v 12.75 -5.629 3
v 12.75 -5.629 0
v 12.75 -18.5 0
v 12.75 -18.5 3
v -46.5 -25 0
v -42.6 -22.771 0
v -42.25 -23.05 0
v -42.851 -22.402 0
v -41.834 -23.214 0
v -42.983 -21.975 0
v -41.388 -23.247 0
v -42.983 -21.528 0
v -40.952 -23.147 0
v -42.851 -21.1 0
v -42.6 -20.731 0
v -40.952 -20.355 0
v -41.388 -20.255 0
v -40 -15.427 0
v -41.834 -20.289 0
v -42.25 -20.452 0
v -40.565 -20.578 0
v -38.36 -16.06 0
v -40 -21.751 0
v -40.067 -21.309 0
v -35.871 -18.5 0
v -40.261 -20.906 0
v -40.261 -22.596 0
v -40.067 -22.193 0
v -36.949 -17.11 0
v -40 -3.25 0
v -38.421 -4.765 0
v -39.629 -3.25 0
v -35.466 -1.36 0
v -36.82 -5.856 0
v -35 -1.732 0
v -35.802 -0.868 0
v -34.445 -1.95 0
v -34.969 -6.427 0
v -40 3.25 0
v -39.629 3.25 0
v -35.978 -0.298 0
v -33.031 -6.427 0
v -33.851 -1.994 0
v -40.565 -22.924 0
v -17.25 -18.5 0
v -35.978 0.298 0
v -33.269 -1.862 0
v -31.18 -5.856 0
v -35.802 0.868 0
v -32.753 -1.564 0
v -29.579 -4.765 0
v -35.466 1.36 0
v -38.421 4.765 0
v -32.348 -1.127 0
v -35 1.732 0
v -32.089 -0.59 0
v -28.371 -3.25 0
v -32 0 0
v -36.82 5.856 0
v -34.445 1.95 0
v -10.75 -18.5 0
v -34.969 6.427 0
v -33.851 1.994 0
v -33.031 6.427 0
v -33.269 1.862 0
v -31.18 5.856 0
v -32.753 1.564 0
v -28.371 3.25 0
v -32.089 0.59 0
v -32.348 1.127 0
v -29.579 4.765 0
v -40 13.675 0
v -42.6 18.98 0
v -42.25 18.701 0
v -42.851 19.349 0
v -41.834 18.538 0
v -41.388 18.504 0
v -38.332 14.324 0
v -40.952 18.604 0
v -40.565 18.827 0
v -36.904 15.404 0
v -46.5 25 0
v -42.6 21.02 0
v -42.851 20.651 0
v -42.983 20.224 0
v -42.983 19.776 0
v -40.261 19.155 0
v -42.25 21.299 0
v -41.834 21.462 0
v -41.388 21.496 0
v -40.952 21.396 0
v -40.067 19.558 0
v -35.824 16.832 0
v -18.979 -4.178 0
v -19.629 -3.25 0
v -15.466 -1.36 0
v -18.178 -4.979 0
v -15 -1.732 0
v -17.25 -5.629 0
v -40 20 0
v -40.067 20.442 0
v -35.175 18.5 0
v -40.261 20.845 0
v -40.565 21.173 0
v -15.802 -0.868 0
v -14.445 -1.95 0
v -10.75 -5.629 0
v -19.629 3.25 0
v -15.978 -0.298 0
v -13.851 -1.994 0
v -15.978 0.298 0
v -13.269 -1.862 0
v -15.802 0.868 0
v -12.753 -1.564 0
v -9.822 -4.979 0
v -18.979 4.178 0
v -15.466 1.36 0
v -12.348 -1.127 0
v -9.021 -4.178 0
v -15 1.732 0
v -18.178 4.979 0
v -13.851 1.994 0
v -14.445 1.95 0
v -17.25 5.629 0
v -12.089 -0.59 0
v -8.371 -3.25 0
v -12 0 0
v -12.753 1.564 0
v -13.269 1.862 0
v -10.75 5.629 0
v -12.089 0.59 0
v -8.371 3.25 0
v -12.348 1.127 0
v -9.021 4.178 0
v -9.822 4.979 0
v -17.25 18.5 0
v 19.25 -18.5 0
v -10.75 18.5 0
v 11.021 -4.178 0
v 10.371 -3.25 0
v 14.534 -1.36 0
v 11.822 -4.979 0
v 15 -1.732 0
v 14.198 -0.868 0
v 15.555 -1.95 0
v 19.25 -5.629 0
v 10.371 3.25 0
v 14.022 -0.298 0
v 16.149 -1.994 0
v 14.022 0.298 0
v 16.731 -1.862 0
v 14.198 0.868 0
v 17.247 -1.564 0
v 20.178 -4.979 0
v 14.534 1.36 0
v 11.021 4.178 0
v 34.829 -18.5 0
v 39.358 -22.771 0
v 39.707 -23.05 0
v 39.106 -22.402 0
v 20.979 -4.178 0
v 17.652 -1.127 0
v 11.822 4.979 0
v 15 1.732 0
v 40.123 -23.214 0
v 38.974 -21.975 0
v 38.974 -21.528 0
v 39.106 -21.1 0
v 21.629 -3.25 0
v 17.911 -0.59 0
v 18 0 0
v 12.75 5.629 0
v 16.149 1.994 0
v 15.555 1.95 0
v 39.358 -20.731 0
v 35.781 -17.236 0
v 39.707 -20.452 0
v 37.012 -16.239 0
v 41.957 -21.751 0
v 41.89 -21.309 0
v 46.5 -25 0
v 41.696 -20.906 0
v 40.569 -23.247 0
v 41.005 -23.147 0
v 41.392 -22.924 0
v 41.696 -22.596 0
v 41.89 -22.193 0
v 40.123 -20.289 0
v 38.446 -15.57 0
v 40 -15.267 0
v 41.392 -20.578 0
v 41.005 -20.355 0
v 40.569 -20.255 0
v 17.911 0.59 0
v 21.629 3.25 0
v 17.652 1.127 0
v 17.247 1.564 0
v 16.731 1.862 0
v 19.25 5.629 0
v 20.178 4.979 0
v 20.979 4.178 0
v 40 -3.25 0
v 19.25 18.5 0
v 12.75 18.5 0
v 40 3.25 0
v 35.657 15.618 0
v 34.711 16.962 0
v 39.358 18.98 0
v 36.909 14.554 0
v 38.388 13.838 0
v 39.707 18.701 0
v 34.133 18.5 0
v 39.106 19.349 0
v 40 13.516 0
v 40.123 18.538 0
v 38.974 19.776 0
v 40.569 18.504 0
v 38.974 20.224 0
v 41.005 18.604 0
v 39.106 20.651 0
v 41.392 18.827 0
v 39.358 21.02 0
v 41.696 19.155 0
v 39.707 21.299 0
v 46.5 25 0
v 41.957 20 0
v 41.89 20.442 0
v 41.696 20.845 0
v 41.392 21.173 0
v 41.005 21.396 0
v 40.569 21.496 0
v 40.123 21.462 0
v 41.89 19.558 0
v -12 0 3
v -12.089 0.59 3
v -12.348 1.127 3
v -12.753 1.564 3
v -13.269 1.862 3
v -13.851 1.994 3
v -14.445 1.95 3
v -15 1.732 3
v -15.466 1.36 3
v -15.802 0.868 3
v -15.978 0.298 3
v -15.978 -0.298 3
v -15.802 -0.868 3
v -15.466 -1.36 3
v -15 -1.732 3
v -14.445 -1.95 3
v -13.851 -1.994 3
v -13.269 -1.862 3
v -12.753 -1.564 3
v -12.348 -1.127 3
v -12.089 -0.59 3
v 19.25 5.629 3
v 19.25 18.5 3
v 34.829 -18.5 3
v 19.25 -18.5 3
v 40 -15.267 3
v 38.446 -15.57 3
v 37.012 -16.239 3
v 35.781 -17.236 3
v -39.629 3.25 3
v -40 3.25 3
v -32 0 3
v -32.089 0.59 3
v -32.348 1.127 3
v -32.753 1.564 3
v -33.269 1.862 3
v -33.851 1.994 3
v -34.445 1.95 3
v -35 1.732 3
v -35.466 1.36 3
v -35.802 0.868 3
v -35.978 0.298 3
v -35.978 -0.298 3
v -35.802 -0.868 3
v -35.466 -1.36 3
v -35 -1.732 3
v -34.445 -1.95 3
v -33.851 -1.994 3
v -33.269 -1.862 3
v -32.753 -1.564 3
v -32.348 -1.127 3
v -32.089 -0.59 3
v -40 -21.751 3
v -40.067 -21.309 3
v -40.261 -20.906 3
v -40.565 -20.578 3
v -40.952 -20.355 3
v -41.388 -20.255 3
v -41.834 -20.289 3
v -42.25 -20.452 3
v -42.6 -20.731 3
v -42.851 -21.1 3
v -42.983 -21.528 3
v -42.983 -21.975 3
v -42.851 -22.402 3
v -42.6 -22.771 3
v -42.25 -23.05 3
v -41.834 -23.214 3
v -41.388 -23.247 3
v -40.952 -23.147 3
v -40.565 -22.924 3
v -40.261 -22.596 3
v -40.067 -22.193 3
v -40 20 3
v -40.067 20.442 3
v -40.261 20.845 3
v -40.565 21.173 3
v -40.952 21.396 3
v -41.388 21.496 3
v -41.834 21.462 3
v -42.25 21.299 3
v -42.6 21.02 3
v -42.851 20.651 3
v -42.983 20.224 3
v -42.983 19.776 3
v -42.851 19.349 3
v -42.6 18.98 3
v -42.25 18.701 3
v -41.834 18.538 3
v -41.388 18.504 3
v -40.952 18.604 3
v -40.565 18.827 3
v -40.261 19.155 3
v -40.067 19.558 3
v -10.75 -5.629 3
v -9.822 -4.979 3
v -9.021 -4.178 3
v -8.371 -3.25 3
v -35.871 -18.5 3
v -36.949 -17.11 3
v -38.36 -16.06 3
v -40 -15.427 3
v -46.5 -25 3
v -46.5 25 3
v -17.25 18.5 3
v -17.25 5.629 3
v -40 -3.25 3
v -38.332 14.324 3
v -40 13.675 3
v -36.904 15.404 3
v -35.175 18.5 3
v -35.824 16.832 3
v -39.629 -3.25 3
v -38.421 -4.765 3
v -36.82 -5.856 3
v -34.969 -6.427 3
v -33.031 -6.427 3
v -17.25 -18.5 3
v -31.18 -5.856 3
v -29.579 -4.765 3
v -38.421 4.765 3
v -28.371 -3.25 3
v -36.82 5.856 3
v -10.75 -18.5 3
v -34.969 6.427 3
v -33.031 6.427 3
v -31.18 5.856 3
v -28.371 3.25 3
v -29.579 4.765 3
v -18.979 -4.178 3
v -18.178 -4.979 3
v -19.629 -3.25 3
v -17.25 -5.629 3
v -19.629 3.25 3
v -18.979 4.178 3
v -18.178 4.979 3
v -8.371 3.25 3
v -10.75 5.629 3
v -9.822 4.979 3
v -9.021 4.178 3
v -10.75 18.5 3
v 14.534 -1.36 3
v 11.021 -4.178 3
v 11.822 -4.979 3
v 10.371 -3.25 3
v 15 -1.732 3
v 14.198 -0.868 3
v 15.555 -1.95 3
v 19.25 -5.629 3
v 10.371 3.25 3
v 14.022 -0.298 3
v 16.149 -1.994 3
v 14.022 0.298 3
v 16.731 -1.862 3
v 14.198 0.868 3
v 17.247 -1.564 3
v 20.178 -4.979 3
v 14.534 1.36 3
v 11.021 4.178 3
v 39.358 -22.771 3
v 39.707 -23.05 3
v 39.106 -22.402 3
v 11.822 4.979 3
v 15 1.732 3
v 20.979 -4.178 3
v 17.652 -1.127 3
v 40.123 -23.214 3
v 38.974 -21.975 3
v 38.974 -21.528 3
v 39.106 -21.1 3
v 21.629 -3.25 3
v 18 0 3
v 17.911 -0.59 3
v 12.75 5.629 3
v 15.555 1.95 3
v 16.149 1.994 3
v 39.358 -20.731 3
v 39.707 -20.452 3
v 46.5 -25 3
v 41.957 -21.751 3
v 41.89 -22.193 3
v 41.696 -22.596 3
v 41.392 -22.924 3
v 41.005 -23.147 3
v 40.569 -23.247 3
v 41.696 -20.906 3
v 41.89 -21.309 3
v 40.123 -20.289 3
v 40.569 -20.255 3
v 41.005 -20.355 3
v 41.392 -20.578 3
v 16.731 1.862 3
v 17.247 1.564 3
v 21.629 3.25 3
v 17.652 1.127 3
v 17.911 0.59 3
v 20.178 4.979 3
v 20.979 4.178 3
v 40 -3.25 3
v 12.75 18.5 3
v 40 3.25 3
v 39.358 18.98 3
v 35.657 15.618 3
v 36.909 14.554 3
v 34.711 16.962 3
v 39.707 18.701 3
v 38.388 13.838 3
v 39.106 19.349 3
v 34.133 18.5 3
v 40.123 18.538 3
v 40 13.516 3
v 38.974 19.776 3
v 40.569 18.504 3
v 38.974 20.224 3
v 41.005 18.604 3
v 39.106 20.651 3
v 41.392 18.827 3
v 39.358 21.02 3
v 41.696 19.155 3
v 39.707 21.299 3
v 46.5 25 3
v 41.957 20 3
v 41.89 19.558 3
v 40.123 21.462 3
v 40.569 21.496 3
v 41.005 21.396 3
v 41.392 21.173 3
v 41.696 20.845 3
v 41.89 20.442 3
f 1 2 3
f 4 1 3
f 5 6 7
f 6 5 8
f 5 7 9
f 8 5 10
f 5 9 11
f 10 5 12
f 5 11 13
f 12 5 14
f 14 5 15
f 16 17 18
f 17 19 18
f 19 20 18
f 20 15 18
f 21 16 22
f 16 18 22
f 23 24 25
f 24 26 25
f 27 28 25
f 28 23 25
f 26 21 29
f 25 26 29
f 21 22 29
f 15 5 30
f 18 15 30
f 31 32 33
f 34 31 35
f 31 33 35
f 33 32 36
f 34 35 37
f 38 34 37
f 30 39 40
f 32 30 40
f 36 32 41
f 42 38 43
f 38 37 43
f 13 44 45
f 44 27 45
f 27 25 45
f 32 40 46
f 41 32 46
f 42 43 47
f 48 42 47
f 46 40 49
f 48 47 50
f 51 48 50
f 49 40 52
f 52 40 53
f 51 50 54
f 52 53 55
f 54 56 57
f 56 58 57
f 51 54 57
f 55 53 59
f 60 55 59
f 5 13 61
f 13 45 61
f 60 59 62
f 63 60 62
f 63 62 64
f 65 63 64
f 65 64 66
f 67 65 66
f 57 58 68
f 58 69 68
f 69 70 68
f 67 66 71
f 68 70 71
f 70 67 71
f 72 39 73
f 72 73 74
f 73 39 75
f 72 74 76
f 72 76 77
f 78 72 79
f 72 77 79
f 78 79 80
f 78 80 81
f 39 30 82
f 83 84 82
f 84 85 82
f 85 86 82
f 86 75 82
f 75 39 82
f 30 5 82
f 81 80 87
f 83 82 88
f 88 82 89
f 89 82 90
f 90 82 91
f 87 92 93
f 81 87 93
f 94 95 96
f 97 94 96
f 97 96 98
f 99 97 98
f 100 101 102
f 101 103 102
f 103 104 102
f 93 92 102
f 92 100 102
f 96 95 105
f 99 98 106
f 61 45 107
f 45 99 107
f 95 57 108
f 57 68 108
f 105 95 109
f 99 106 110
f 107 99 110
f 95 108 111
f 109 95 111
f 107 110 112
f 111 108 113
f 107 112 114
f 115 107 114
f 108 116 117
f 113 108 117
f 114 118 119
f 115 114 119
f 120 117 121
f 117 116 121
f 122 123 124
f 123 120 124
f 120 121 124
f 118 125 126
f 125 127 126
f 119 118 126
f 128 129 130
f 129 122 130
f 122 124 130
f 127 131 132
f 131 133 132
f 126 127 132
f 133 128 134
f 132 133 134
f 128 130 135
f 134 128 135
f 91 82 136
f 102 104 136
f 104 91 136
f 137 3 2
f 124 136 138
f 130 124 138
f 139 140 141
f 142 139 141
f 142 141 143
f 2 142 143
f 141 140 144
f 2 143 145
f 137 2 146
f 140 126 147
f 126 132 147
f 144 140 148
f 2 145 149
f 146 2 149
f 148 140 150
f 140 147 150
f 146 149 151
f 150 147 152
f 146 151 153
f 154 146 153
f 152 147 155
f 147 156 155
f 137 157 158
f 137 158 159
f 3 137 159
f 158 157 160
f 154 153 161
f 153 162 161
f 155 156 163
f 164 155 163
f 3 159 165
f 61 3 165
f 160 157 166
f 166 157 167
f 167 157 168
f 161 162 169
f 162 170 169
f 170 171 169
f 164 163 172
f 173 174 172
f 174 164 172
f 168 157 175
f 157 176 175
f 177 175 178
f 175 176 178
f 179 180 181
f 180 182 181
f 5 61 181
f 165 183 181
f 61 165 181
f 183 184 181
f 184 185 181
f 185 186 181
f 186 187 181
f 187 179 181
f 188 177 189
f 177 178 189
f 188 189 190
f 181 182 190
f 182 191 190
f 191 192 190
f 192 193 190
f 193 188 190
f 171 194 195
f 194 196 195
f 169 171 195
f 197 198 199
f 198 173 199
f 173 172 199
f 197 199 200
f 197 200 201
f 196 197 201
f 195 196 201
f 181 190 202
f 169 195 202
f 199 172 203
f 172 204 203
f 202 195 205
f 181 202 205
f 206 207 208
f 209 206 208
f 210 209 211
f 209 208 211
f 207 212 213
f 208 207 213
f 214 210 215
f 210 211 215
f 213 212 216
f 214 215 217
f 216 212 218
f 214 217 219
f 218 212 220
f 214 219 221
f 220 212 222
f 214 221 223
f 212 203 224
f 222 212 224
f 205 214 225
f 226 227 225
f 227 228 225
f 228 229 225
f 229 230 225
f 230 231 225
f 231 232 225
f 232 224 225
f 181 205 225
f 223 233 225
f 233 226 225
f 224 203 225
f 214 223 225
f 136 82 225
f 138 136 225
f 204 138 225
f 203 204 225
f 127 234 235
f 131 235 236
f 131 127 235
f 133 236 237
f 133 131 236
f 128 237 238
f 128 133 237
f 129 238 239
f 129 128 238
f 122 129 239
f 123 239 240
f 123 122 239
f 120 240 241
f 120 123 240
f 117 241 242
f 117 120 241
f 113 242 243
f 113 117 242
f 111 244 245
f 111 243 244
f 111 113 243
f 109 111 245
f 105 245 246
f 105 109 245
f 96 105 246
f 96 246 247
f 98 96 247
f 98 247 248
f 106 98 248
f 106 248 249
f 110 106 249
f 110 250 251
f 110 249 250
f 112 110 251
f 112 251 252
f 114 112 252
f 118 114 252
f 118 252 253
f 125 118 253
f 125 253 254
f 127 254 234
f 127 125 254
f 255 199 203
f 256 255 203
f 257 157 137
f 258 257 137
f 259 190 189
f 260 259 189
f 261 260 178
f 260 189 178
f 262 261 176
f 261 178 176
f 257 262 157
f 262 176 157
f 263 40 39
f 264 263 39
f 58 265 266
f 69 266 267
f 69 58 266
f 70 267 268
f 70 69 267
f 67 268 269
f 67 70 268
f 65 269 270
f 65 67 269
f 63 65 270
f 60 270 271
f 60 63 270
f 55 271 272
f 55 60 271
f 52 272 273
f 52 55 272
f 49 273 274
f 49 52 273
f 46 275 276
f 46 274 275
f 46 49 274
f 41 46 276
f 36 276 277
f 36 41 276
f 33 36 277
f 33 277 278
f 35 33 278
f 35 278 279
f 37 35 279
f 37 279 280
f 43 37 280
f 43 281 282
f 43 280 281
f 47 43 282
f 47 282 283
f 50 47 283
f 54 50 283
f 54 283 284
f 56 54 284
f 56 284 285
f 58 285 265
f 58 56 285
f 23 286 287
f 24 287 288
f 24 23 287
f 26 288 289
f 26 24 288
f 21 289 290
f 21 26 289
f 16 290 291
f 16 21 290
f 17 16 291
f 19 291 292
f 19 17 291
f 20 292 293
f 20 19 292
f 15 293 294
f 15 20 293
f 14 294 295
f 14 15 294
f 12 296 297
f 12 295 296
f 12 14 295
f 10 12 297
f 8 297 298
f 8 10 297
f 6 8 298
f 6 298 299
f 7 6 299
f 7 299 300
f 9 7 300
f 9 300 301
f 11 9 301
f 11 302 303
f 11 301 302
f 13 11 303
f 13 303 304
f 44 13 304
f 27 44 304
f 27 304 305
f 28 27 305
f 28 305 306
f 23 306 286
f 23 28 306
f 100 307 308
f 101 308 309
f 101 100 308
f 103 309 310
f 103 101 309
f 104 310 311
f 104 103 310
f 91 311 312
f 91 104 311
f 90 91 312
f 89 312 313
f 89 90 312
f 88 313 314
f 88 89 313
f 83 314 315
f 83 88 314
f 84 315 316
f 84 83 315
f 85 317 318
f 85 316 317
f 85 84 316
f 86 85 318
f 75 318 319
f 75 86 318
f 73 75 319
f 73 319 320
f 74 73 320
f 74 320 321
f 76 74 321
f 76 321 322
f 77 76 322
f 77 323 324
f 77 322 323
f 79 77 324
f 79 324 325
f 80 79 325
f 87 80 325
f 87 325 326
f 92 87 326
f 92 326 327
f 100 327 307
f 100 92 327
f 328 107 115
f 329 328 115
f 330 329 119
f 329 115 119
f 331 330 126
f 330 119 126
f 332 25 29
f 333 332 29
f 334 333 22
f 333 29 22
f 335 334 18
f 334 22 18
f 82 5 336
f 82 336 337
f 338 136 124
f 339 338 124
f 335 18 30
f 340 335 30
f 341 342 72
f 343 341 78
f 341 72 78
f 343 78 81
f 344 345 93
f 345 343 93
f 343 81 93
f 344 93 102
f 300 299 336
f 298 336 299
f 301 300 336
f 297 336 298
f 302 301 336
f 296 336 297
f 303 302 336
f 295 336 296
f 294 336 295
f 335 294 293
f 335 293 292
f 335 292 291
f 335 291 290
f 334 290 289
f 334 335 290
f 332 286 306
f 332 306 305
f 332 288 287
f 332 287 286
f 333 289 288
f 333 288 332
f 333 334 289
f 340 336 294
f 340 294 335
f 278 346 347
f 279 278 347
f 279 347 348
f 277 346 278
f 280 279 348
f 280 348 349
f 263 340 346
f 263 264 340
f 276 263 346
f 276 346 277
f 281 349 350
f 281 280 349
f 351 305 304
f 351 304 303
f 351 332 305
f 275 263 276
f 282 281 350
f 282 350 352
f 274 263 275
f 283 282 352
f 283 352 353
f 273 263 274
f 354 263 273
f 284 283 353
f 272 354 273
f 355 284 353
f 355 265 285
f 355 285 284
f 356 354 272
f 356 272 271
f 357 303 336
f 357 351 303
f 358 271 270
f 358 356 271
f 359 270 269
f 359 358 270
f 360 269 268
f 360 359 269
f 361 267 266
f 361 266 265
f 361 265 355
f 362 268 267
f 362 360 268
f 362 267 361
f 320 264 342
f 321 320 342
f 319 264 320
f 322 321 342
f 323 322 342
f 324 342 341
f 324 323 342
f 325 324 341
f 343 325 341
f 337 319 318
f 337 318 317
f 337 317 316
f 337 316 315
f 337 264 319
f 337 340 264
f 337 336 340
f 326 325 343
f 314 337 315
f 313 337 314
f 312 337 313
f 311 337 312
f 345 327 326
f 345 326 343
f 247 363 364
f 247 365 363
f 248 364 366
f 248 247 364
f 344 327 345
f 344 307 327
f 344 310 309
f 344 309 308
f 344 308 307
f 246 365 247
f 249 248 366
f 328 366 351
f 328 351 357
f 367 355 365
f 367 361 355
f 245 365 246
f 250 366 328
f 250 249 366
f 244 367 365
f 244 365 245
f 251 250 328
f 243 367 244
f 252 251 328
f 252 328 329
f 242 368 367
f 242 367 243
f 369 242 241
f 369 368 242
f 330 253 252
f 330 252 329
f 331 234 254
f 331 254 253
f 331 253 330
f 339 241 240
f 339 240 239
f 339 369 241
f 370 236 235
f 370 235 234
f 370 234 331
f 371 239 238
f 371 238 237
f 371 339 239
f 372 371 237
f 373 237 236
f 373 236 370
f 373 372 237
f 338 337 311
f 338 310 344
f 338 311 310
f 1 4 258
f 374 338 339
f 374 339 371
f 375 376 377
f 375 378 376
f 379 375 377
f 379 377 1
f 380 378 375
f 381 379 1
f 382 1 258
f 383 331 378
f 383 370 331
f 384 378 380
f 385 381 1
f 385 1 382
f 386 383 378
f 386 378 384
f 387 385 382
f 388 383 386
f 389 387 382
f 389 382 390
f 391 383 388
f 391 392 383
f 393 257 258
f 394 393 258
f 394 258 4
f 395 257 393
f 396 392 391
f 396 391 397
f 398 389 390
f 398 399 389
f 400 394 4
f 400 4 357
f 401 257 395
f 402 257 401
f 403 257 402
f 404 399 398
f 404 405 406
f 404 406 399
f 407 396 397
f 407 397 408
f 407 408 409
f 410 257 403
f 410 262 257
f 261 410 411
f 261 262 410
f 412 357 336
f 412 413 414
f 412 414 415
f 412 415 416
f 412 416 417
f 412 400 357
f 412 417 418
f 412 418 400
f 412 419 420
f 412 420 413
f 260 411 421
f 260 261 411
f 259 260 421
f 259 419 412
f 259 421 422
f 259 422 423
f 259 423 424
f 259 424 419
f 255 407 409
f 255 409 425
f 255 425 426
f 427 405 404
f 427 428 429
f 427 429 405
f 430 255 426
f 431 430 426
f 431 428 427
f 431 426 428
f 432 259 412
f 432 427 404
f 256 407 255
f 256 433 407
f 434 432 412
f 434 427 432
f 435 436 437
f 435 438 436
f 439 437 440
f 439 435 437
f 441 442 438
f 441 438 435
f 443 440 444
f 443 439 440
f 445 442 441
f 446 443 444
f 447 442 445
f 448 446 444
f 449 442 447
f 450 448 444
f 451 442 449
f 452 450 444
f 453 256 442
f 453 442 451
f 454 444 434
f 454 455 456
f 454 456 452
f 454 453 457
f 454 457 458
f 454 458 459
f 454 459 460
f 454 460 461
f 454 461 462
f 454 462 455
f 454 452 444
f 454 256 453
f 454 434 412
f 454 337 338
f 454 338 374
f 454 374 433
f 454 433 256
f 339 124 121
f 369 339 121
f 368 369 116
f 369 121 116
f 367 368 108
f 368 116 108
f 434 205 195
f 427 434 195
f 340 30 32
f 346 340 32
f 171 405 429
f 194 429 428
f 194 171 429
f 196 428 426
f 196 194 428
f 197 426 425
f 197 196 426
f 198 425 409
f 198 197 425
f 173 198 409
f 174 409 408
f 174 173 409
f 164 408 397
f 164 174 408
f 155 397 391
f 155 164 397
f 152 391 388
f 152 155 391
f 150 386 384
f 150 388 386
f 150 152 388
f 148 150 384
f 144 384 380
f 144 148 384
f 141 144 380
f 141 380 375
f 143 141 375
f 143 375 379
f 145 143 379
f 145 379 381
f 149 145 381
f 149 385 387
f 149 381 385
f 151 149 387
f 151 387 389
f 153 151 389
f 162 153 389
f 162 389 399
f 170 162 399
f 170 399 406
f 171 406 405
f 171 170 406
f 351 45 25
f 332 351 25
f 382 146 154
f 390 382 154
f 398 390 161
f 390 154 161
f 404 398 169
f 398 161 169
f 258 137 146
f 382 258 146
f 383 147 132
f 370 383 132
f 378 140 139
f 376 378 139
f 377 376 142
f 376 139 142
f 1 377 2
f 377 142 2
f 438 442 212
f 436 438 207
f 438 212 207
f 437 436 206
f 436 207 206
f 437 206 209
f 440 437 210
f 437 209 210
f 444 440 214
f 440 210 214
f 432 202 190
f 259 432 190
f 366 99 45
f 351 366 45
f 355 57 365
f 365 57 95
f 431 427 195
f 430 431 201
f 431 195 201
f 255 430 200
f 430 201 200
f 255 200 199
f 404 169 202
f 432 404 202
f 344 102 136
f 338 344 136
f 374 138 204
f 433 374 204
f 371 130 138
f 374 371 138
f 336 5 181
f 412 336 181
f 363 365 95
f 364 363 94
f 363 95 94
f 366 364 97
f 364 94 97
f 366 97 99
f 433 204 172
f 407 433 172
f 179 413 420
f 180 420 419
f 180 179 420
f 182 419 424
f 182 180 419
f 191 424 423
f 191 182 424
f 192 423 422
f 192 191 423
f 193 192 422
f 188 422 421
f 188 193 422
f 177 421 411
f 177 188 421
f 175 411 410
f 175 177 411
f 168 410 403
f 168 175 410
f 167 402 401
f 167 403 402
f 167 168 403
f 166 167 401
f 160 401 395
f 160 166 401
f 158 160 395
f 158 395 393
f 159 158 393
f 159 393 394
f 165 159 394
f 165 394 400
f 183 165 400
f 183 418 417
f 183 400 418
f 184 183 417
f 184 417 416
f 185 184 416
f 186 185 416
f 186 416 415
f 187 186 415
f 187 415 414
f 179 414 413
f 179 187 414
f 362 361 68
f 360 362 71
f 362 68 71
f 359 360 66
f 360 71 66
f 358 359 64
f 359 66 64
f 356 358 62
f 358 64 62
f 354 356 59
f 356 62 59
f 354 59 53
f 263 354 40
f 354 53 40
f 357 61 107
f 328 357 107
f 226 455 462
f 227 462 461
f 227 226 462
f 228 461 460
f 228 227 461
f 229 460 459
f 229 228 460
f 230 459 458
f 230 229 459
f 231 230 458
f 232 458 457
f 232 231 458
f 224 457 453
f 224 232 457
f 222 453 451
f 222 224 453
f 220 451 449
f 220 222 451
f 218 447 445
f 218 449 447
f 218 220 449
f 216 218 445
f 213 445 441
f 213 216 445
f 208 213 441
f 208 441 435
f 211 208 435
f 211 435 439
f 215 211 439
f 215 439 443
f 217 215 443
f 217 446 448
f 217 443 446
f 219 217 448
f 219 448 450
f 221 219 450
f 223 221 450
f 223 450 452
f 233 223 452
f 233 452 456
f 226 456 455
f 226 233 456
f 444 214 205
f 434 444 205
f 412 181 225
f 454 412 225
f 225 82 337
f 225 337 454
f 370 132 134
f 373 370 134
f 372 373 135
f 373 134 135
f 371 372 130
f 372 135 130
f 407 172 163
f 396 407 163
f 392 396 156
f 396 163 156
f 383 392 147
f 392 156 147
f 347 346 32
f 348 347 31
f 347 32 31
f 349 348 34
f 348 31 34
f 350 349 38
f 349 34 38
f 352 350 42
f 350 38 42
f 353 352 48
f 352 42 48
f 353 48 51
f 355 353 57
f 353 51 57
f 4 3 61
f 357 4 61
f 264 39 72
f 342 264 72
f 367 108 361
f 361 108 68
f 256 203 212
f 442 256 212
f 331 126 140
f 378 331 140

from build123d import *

# Parameters (mm, degrees)
SKETCH2_W           = 93
SKETCH2_H           = 50
BOSS_EXTRUDE1_DEPTH = 3
SKETCH1_R           = 1.5
SKETCH1_R_2         = 2
CUT_EXTRUDE9_DEPTH  = 4


with BuildPart() as part:
    # Sketch2 → Boss-Extrude1 (new body)
    with BuildSketch(Plane.XY):
        Rectangle(SKETCH2_W, SKETCH2_H)
    extrude(amount=BOSS_EXTRUDE1_DEPTH)

    # Sketch1 → Cut-Extrude9 (cut, through all)
    with BuildSketch(Plane.XY):
        with BuildLine():
            ThreePointArc((21.629165125, 3.25), (20.596194078, 4.596194078), (19.25, 5.629165125))
            Line((19.25, 5.629165125), (19.25, 18.5))
            Line((19.25, 18.5), (34.132524712, 18.5))
            ThreePointArc((34.132524712, 18.5), (36.249054116, 15.045959438), (40, 13.516090852))
            Line((40, 13.516090852), (40, 3.25))
            Line((40, 3.25), (21.629165125, 3.25))
        make_face()
        with BuildLine():
            ThreePointArc((12.75, 5.629165125), (11.403805922, 4.596194078), (10.370834875, 3.25))
            Line((10.370834875, 3.25), (-8.370834875, 3.25))
            ThreePointArc((-8.370834875, 3.25), (-9.403805922, 4.596194078), (-10.75, 5.629165125))
            Line((-10.75, 5.629165125), (-10.75, 18.5))
            Line((-10.75, 18.5), (12.75, 18.5))
            Line((12.75, 18.5), (12.75, 5.629165125))
        make_face()
        with BuildLine():
            ThreePointArc((-40, 13.67544468), (-36.903805922, 15.403805922), (-35.17544468, 18.5))
            Line((-35.17544468, 18.5), (-17.25, 18.5))
            Line((-17.25, 18.5), (-17.25, 5.629165125))
            ThreePointArc((-17.25, 5.629165125), (-18.596194078, 4.596194078), (-19.629165125, 3.25))
            Line((-19.629165125, 3.25), (-28.370834875, 3.25))
            ThreePointArc((-28.370834875, 3.25), (-34, 6.5), (-39.629165125, 3.25))
            Line((-39.629165125, 3.25), (-40, 3.25))
            Line((-40, 3.25), (-40, 13.67544468))
        make_face()
        with BuildLine():
            ThreePointArc((-35.871480673, -18.5), (-37.618576198, -16.537237855), (-40, -15.426562977))
            Line((-40, -15.426562977), (-40, -3.25))
            Line((-40, -3.25), (-39.629165125, -3.25))
            ThreePointArc((-39.629165125, -3.25), (-34, -6.5), (-28.370834875, -3.25))
            Line((-28.370834875, -3.25), (-19.629165125, -3.25))
            ThreePointArc((-19.629165125, -3.25), (-18.596194078, -4.596194078), (-17.25, -5.629165125))
            Line((-17.25, -5.629165125), (-17.25, -18.5))
            Line((-17.25, -18.5), (-35.871480673, -18.5))
        make_face()
        with BuildLine():
            ThreePointArc((-10.75, -5.629165125), (-9.403805922, -4.596194078), (-8.370834875, -3.25))
            Line((-8.370834875, -3.25), (10.370834875, -3.25))
            ThreePointArc((10.370834875, -3.25), (11.403805922, -4.596194078), (12.75, -5.629165125))
            Line((12.75, -5.629165125), (12.75, -18.5))
            Line((12.75, -18.5), (-10.75, -18.5))
            Line((-10.75, -18.5), (-10.75, -5.629165125))
        make_face()
        with BuildLine():
            ThreePointArc((19.25, -5.629165125), (20.596194078, -4.596194078), (21.629165125, -3.25))
            Line((21.629165125, -3.25), (40, -3.25))
            Line((40, -3.25), (40, -15.267209149))
            ThreePointArc((40, -15.267209149), (37.011595442, -16.239436527), (34.828560705, -18.5))
            Line((34.828560705, -18.5), (19.25, -18.5))
            Line((19.25, -18.5), (19.25, -5.629165125))
        make_face()
        with Locations((40.457080032, 20)):
            Circle(SKETCH1_R)
        with Locations((-41.5, 20)):
            Circle(SKETCH1_R)
        with Locations((-34, 0)):
            Circle(SKETCH1_R_2)
        with Locations((-14, 0)):
            Circle(SKETCH1_R_2)
        with Locations((16, 0)):
            Circle(SKETCH1_R_2)
        with Locations((40.457080032, -21.751118297)):
            Circle(SKETCH1_R)
        with Locations((-41.5, -21.751118297)):
            Circle(SKETCH1_R)
    extrude(amount=CUT_EXTRUDE9_DEPTH, mode=Mode.SUBTRACT)


solid = part.part
